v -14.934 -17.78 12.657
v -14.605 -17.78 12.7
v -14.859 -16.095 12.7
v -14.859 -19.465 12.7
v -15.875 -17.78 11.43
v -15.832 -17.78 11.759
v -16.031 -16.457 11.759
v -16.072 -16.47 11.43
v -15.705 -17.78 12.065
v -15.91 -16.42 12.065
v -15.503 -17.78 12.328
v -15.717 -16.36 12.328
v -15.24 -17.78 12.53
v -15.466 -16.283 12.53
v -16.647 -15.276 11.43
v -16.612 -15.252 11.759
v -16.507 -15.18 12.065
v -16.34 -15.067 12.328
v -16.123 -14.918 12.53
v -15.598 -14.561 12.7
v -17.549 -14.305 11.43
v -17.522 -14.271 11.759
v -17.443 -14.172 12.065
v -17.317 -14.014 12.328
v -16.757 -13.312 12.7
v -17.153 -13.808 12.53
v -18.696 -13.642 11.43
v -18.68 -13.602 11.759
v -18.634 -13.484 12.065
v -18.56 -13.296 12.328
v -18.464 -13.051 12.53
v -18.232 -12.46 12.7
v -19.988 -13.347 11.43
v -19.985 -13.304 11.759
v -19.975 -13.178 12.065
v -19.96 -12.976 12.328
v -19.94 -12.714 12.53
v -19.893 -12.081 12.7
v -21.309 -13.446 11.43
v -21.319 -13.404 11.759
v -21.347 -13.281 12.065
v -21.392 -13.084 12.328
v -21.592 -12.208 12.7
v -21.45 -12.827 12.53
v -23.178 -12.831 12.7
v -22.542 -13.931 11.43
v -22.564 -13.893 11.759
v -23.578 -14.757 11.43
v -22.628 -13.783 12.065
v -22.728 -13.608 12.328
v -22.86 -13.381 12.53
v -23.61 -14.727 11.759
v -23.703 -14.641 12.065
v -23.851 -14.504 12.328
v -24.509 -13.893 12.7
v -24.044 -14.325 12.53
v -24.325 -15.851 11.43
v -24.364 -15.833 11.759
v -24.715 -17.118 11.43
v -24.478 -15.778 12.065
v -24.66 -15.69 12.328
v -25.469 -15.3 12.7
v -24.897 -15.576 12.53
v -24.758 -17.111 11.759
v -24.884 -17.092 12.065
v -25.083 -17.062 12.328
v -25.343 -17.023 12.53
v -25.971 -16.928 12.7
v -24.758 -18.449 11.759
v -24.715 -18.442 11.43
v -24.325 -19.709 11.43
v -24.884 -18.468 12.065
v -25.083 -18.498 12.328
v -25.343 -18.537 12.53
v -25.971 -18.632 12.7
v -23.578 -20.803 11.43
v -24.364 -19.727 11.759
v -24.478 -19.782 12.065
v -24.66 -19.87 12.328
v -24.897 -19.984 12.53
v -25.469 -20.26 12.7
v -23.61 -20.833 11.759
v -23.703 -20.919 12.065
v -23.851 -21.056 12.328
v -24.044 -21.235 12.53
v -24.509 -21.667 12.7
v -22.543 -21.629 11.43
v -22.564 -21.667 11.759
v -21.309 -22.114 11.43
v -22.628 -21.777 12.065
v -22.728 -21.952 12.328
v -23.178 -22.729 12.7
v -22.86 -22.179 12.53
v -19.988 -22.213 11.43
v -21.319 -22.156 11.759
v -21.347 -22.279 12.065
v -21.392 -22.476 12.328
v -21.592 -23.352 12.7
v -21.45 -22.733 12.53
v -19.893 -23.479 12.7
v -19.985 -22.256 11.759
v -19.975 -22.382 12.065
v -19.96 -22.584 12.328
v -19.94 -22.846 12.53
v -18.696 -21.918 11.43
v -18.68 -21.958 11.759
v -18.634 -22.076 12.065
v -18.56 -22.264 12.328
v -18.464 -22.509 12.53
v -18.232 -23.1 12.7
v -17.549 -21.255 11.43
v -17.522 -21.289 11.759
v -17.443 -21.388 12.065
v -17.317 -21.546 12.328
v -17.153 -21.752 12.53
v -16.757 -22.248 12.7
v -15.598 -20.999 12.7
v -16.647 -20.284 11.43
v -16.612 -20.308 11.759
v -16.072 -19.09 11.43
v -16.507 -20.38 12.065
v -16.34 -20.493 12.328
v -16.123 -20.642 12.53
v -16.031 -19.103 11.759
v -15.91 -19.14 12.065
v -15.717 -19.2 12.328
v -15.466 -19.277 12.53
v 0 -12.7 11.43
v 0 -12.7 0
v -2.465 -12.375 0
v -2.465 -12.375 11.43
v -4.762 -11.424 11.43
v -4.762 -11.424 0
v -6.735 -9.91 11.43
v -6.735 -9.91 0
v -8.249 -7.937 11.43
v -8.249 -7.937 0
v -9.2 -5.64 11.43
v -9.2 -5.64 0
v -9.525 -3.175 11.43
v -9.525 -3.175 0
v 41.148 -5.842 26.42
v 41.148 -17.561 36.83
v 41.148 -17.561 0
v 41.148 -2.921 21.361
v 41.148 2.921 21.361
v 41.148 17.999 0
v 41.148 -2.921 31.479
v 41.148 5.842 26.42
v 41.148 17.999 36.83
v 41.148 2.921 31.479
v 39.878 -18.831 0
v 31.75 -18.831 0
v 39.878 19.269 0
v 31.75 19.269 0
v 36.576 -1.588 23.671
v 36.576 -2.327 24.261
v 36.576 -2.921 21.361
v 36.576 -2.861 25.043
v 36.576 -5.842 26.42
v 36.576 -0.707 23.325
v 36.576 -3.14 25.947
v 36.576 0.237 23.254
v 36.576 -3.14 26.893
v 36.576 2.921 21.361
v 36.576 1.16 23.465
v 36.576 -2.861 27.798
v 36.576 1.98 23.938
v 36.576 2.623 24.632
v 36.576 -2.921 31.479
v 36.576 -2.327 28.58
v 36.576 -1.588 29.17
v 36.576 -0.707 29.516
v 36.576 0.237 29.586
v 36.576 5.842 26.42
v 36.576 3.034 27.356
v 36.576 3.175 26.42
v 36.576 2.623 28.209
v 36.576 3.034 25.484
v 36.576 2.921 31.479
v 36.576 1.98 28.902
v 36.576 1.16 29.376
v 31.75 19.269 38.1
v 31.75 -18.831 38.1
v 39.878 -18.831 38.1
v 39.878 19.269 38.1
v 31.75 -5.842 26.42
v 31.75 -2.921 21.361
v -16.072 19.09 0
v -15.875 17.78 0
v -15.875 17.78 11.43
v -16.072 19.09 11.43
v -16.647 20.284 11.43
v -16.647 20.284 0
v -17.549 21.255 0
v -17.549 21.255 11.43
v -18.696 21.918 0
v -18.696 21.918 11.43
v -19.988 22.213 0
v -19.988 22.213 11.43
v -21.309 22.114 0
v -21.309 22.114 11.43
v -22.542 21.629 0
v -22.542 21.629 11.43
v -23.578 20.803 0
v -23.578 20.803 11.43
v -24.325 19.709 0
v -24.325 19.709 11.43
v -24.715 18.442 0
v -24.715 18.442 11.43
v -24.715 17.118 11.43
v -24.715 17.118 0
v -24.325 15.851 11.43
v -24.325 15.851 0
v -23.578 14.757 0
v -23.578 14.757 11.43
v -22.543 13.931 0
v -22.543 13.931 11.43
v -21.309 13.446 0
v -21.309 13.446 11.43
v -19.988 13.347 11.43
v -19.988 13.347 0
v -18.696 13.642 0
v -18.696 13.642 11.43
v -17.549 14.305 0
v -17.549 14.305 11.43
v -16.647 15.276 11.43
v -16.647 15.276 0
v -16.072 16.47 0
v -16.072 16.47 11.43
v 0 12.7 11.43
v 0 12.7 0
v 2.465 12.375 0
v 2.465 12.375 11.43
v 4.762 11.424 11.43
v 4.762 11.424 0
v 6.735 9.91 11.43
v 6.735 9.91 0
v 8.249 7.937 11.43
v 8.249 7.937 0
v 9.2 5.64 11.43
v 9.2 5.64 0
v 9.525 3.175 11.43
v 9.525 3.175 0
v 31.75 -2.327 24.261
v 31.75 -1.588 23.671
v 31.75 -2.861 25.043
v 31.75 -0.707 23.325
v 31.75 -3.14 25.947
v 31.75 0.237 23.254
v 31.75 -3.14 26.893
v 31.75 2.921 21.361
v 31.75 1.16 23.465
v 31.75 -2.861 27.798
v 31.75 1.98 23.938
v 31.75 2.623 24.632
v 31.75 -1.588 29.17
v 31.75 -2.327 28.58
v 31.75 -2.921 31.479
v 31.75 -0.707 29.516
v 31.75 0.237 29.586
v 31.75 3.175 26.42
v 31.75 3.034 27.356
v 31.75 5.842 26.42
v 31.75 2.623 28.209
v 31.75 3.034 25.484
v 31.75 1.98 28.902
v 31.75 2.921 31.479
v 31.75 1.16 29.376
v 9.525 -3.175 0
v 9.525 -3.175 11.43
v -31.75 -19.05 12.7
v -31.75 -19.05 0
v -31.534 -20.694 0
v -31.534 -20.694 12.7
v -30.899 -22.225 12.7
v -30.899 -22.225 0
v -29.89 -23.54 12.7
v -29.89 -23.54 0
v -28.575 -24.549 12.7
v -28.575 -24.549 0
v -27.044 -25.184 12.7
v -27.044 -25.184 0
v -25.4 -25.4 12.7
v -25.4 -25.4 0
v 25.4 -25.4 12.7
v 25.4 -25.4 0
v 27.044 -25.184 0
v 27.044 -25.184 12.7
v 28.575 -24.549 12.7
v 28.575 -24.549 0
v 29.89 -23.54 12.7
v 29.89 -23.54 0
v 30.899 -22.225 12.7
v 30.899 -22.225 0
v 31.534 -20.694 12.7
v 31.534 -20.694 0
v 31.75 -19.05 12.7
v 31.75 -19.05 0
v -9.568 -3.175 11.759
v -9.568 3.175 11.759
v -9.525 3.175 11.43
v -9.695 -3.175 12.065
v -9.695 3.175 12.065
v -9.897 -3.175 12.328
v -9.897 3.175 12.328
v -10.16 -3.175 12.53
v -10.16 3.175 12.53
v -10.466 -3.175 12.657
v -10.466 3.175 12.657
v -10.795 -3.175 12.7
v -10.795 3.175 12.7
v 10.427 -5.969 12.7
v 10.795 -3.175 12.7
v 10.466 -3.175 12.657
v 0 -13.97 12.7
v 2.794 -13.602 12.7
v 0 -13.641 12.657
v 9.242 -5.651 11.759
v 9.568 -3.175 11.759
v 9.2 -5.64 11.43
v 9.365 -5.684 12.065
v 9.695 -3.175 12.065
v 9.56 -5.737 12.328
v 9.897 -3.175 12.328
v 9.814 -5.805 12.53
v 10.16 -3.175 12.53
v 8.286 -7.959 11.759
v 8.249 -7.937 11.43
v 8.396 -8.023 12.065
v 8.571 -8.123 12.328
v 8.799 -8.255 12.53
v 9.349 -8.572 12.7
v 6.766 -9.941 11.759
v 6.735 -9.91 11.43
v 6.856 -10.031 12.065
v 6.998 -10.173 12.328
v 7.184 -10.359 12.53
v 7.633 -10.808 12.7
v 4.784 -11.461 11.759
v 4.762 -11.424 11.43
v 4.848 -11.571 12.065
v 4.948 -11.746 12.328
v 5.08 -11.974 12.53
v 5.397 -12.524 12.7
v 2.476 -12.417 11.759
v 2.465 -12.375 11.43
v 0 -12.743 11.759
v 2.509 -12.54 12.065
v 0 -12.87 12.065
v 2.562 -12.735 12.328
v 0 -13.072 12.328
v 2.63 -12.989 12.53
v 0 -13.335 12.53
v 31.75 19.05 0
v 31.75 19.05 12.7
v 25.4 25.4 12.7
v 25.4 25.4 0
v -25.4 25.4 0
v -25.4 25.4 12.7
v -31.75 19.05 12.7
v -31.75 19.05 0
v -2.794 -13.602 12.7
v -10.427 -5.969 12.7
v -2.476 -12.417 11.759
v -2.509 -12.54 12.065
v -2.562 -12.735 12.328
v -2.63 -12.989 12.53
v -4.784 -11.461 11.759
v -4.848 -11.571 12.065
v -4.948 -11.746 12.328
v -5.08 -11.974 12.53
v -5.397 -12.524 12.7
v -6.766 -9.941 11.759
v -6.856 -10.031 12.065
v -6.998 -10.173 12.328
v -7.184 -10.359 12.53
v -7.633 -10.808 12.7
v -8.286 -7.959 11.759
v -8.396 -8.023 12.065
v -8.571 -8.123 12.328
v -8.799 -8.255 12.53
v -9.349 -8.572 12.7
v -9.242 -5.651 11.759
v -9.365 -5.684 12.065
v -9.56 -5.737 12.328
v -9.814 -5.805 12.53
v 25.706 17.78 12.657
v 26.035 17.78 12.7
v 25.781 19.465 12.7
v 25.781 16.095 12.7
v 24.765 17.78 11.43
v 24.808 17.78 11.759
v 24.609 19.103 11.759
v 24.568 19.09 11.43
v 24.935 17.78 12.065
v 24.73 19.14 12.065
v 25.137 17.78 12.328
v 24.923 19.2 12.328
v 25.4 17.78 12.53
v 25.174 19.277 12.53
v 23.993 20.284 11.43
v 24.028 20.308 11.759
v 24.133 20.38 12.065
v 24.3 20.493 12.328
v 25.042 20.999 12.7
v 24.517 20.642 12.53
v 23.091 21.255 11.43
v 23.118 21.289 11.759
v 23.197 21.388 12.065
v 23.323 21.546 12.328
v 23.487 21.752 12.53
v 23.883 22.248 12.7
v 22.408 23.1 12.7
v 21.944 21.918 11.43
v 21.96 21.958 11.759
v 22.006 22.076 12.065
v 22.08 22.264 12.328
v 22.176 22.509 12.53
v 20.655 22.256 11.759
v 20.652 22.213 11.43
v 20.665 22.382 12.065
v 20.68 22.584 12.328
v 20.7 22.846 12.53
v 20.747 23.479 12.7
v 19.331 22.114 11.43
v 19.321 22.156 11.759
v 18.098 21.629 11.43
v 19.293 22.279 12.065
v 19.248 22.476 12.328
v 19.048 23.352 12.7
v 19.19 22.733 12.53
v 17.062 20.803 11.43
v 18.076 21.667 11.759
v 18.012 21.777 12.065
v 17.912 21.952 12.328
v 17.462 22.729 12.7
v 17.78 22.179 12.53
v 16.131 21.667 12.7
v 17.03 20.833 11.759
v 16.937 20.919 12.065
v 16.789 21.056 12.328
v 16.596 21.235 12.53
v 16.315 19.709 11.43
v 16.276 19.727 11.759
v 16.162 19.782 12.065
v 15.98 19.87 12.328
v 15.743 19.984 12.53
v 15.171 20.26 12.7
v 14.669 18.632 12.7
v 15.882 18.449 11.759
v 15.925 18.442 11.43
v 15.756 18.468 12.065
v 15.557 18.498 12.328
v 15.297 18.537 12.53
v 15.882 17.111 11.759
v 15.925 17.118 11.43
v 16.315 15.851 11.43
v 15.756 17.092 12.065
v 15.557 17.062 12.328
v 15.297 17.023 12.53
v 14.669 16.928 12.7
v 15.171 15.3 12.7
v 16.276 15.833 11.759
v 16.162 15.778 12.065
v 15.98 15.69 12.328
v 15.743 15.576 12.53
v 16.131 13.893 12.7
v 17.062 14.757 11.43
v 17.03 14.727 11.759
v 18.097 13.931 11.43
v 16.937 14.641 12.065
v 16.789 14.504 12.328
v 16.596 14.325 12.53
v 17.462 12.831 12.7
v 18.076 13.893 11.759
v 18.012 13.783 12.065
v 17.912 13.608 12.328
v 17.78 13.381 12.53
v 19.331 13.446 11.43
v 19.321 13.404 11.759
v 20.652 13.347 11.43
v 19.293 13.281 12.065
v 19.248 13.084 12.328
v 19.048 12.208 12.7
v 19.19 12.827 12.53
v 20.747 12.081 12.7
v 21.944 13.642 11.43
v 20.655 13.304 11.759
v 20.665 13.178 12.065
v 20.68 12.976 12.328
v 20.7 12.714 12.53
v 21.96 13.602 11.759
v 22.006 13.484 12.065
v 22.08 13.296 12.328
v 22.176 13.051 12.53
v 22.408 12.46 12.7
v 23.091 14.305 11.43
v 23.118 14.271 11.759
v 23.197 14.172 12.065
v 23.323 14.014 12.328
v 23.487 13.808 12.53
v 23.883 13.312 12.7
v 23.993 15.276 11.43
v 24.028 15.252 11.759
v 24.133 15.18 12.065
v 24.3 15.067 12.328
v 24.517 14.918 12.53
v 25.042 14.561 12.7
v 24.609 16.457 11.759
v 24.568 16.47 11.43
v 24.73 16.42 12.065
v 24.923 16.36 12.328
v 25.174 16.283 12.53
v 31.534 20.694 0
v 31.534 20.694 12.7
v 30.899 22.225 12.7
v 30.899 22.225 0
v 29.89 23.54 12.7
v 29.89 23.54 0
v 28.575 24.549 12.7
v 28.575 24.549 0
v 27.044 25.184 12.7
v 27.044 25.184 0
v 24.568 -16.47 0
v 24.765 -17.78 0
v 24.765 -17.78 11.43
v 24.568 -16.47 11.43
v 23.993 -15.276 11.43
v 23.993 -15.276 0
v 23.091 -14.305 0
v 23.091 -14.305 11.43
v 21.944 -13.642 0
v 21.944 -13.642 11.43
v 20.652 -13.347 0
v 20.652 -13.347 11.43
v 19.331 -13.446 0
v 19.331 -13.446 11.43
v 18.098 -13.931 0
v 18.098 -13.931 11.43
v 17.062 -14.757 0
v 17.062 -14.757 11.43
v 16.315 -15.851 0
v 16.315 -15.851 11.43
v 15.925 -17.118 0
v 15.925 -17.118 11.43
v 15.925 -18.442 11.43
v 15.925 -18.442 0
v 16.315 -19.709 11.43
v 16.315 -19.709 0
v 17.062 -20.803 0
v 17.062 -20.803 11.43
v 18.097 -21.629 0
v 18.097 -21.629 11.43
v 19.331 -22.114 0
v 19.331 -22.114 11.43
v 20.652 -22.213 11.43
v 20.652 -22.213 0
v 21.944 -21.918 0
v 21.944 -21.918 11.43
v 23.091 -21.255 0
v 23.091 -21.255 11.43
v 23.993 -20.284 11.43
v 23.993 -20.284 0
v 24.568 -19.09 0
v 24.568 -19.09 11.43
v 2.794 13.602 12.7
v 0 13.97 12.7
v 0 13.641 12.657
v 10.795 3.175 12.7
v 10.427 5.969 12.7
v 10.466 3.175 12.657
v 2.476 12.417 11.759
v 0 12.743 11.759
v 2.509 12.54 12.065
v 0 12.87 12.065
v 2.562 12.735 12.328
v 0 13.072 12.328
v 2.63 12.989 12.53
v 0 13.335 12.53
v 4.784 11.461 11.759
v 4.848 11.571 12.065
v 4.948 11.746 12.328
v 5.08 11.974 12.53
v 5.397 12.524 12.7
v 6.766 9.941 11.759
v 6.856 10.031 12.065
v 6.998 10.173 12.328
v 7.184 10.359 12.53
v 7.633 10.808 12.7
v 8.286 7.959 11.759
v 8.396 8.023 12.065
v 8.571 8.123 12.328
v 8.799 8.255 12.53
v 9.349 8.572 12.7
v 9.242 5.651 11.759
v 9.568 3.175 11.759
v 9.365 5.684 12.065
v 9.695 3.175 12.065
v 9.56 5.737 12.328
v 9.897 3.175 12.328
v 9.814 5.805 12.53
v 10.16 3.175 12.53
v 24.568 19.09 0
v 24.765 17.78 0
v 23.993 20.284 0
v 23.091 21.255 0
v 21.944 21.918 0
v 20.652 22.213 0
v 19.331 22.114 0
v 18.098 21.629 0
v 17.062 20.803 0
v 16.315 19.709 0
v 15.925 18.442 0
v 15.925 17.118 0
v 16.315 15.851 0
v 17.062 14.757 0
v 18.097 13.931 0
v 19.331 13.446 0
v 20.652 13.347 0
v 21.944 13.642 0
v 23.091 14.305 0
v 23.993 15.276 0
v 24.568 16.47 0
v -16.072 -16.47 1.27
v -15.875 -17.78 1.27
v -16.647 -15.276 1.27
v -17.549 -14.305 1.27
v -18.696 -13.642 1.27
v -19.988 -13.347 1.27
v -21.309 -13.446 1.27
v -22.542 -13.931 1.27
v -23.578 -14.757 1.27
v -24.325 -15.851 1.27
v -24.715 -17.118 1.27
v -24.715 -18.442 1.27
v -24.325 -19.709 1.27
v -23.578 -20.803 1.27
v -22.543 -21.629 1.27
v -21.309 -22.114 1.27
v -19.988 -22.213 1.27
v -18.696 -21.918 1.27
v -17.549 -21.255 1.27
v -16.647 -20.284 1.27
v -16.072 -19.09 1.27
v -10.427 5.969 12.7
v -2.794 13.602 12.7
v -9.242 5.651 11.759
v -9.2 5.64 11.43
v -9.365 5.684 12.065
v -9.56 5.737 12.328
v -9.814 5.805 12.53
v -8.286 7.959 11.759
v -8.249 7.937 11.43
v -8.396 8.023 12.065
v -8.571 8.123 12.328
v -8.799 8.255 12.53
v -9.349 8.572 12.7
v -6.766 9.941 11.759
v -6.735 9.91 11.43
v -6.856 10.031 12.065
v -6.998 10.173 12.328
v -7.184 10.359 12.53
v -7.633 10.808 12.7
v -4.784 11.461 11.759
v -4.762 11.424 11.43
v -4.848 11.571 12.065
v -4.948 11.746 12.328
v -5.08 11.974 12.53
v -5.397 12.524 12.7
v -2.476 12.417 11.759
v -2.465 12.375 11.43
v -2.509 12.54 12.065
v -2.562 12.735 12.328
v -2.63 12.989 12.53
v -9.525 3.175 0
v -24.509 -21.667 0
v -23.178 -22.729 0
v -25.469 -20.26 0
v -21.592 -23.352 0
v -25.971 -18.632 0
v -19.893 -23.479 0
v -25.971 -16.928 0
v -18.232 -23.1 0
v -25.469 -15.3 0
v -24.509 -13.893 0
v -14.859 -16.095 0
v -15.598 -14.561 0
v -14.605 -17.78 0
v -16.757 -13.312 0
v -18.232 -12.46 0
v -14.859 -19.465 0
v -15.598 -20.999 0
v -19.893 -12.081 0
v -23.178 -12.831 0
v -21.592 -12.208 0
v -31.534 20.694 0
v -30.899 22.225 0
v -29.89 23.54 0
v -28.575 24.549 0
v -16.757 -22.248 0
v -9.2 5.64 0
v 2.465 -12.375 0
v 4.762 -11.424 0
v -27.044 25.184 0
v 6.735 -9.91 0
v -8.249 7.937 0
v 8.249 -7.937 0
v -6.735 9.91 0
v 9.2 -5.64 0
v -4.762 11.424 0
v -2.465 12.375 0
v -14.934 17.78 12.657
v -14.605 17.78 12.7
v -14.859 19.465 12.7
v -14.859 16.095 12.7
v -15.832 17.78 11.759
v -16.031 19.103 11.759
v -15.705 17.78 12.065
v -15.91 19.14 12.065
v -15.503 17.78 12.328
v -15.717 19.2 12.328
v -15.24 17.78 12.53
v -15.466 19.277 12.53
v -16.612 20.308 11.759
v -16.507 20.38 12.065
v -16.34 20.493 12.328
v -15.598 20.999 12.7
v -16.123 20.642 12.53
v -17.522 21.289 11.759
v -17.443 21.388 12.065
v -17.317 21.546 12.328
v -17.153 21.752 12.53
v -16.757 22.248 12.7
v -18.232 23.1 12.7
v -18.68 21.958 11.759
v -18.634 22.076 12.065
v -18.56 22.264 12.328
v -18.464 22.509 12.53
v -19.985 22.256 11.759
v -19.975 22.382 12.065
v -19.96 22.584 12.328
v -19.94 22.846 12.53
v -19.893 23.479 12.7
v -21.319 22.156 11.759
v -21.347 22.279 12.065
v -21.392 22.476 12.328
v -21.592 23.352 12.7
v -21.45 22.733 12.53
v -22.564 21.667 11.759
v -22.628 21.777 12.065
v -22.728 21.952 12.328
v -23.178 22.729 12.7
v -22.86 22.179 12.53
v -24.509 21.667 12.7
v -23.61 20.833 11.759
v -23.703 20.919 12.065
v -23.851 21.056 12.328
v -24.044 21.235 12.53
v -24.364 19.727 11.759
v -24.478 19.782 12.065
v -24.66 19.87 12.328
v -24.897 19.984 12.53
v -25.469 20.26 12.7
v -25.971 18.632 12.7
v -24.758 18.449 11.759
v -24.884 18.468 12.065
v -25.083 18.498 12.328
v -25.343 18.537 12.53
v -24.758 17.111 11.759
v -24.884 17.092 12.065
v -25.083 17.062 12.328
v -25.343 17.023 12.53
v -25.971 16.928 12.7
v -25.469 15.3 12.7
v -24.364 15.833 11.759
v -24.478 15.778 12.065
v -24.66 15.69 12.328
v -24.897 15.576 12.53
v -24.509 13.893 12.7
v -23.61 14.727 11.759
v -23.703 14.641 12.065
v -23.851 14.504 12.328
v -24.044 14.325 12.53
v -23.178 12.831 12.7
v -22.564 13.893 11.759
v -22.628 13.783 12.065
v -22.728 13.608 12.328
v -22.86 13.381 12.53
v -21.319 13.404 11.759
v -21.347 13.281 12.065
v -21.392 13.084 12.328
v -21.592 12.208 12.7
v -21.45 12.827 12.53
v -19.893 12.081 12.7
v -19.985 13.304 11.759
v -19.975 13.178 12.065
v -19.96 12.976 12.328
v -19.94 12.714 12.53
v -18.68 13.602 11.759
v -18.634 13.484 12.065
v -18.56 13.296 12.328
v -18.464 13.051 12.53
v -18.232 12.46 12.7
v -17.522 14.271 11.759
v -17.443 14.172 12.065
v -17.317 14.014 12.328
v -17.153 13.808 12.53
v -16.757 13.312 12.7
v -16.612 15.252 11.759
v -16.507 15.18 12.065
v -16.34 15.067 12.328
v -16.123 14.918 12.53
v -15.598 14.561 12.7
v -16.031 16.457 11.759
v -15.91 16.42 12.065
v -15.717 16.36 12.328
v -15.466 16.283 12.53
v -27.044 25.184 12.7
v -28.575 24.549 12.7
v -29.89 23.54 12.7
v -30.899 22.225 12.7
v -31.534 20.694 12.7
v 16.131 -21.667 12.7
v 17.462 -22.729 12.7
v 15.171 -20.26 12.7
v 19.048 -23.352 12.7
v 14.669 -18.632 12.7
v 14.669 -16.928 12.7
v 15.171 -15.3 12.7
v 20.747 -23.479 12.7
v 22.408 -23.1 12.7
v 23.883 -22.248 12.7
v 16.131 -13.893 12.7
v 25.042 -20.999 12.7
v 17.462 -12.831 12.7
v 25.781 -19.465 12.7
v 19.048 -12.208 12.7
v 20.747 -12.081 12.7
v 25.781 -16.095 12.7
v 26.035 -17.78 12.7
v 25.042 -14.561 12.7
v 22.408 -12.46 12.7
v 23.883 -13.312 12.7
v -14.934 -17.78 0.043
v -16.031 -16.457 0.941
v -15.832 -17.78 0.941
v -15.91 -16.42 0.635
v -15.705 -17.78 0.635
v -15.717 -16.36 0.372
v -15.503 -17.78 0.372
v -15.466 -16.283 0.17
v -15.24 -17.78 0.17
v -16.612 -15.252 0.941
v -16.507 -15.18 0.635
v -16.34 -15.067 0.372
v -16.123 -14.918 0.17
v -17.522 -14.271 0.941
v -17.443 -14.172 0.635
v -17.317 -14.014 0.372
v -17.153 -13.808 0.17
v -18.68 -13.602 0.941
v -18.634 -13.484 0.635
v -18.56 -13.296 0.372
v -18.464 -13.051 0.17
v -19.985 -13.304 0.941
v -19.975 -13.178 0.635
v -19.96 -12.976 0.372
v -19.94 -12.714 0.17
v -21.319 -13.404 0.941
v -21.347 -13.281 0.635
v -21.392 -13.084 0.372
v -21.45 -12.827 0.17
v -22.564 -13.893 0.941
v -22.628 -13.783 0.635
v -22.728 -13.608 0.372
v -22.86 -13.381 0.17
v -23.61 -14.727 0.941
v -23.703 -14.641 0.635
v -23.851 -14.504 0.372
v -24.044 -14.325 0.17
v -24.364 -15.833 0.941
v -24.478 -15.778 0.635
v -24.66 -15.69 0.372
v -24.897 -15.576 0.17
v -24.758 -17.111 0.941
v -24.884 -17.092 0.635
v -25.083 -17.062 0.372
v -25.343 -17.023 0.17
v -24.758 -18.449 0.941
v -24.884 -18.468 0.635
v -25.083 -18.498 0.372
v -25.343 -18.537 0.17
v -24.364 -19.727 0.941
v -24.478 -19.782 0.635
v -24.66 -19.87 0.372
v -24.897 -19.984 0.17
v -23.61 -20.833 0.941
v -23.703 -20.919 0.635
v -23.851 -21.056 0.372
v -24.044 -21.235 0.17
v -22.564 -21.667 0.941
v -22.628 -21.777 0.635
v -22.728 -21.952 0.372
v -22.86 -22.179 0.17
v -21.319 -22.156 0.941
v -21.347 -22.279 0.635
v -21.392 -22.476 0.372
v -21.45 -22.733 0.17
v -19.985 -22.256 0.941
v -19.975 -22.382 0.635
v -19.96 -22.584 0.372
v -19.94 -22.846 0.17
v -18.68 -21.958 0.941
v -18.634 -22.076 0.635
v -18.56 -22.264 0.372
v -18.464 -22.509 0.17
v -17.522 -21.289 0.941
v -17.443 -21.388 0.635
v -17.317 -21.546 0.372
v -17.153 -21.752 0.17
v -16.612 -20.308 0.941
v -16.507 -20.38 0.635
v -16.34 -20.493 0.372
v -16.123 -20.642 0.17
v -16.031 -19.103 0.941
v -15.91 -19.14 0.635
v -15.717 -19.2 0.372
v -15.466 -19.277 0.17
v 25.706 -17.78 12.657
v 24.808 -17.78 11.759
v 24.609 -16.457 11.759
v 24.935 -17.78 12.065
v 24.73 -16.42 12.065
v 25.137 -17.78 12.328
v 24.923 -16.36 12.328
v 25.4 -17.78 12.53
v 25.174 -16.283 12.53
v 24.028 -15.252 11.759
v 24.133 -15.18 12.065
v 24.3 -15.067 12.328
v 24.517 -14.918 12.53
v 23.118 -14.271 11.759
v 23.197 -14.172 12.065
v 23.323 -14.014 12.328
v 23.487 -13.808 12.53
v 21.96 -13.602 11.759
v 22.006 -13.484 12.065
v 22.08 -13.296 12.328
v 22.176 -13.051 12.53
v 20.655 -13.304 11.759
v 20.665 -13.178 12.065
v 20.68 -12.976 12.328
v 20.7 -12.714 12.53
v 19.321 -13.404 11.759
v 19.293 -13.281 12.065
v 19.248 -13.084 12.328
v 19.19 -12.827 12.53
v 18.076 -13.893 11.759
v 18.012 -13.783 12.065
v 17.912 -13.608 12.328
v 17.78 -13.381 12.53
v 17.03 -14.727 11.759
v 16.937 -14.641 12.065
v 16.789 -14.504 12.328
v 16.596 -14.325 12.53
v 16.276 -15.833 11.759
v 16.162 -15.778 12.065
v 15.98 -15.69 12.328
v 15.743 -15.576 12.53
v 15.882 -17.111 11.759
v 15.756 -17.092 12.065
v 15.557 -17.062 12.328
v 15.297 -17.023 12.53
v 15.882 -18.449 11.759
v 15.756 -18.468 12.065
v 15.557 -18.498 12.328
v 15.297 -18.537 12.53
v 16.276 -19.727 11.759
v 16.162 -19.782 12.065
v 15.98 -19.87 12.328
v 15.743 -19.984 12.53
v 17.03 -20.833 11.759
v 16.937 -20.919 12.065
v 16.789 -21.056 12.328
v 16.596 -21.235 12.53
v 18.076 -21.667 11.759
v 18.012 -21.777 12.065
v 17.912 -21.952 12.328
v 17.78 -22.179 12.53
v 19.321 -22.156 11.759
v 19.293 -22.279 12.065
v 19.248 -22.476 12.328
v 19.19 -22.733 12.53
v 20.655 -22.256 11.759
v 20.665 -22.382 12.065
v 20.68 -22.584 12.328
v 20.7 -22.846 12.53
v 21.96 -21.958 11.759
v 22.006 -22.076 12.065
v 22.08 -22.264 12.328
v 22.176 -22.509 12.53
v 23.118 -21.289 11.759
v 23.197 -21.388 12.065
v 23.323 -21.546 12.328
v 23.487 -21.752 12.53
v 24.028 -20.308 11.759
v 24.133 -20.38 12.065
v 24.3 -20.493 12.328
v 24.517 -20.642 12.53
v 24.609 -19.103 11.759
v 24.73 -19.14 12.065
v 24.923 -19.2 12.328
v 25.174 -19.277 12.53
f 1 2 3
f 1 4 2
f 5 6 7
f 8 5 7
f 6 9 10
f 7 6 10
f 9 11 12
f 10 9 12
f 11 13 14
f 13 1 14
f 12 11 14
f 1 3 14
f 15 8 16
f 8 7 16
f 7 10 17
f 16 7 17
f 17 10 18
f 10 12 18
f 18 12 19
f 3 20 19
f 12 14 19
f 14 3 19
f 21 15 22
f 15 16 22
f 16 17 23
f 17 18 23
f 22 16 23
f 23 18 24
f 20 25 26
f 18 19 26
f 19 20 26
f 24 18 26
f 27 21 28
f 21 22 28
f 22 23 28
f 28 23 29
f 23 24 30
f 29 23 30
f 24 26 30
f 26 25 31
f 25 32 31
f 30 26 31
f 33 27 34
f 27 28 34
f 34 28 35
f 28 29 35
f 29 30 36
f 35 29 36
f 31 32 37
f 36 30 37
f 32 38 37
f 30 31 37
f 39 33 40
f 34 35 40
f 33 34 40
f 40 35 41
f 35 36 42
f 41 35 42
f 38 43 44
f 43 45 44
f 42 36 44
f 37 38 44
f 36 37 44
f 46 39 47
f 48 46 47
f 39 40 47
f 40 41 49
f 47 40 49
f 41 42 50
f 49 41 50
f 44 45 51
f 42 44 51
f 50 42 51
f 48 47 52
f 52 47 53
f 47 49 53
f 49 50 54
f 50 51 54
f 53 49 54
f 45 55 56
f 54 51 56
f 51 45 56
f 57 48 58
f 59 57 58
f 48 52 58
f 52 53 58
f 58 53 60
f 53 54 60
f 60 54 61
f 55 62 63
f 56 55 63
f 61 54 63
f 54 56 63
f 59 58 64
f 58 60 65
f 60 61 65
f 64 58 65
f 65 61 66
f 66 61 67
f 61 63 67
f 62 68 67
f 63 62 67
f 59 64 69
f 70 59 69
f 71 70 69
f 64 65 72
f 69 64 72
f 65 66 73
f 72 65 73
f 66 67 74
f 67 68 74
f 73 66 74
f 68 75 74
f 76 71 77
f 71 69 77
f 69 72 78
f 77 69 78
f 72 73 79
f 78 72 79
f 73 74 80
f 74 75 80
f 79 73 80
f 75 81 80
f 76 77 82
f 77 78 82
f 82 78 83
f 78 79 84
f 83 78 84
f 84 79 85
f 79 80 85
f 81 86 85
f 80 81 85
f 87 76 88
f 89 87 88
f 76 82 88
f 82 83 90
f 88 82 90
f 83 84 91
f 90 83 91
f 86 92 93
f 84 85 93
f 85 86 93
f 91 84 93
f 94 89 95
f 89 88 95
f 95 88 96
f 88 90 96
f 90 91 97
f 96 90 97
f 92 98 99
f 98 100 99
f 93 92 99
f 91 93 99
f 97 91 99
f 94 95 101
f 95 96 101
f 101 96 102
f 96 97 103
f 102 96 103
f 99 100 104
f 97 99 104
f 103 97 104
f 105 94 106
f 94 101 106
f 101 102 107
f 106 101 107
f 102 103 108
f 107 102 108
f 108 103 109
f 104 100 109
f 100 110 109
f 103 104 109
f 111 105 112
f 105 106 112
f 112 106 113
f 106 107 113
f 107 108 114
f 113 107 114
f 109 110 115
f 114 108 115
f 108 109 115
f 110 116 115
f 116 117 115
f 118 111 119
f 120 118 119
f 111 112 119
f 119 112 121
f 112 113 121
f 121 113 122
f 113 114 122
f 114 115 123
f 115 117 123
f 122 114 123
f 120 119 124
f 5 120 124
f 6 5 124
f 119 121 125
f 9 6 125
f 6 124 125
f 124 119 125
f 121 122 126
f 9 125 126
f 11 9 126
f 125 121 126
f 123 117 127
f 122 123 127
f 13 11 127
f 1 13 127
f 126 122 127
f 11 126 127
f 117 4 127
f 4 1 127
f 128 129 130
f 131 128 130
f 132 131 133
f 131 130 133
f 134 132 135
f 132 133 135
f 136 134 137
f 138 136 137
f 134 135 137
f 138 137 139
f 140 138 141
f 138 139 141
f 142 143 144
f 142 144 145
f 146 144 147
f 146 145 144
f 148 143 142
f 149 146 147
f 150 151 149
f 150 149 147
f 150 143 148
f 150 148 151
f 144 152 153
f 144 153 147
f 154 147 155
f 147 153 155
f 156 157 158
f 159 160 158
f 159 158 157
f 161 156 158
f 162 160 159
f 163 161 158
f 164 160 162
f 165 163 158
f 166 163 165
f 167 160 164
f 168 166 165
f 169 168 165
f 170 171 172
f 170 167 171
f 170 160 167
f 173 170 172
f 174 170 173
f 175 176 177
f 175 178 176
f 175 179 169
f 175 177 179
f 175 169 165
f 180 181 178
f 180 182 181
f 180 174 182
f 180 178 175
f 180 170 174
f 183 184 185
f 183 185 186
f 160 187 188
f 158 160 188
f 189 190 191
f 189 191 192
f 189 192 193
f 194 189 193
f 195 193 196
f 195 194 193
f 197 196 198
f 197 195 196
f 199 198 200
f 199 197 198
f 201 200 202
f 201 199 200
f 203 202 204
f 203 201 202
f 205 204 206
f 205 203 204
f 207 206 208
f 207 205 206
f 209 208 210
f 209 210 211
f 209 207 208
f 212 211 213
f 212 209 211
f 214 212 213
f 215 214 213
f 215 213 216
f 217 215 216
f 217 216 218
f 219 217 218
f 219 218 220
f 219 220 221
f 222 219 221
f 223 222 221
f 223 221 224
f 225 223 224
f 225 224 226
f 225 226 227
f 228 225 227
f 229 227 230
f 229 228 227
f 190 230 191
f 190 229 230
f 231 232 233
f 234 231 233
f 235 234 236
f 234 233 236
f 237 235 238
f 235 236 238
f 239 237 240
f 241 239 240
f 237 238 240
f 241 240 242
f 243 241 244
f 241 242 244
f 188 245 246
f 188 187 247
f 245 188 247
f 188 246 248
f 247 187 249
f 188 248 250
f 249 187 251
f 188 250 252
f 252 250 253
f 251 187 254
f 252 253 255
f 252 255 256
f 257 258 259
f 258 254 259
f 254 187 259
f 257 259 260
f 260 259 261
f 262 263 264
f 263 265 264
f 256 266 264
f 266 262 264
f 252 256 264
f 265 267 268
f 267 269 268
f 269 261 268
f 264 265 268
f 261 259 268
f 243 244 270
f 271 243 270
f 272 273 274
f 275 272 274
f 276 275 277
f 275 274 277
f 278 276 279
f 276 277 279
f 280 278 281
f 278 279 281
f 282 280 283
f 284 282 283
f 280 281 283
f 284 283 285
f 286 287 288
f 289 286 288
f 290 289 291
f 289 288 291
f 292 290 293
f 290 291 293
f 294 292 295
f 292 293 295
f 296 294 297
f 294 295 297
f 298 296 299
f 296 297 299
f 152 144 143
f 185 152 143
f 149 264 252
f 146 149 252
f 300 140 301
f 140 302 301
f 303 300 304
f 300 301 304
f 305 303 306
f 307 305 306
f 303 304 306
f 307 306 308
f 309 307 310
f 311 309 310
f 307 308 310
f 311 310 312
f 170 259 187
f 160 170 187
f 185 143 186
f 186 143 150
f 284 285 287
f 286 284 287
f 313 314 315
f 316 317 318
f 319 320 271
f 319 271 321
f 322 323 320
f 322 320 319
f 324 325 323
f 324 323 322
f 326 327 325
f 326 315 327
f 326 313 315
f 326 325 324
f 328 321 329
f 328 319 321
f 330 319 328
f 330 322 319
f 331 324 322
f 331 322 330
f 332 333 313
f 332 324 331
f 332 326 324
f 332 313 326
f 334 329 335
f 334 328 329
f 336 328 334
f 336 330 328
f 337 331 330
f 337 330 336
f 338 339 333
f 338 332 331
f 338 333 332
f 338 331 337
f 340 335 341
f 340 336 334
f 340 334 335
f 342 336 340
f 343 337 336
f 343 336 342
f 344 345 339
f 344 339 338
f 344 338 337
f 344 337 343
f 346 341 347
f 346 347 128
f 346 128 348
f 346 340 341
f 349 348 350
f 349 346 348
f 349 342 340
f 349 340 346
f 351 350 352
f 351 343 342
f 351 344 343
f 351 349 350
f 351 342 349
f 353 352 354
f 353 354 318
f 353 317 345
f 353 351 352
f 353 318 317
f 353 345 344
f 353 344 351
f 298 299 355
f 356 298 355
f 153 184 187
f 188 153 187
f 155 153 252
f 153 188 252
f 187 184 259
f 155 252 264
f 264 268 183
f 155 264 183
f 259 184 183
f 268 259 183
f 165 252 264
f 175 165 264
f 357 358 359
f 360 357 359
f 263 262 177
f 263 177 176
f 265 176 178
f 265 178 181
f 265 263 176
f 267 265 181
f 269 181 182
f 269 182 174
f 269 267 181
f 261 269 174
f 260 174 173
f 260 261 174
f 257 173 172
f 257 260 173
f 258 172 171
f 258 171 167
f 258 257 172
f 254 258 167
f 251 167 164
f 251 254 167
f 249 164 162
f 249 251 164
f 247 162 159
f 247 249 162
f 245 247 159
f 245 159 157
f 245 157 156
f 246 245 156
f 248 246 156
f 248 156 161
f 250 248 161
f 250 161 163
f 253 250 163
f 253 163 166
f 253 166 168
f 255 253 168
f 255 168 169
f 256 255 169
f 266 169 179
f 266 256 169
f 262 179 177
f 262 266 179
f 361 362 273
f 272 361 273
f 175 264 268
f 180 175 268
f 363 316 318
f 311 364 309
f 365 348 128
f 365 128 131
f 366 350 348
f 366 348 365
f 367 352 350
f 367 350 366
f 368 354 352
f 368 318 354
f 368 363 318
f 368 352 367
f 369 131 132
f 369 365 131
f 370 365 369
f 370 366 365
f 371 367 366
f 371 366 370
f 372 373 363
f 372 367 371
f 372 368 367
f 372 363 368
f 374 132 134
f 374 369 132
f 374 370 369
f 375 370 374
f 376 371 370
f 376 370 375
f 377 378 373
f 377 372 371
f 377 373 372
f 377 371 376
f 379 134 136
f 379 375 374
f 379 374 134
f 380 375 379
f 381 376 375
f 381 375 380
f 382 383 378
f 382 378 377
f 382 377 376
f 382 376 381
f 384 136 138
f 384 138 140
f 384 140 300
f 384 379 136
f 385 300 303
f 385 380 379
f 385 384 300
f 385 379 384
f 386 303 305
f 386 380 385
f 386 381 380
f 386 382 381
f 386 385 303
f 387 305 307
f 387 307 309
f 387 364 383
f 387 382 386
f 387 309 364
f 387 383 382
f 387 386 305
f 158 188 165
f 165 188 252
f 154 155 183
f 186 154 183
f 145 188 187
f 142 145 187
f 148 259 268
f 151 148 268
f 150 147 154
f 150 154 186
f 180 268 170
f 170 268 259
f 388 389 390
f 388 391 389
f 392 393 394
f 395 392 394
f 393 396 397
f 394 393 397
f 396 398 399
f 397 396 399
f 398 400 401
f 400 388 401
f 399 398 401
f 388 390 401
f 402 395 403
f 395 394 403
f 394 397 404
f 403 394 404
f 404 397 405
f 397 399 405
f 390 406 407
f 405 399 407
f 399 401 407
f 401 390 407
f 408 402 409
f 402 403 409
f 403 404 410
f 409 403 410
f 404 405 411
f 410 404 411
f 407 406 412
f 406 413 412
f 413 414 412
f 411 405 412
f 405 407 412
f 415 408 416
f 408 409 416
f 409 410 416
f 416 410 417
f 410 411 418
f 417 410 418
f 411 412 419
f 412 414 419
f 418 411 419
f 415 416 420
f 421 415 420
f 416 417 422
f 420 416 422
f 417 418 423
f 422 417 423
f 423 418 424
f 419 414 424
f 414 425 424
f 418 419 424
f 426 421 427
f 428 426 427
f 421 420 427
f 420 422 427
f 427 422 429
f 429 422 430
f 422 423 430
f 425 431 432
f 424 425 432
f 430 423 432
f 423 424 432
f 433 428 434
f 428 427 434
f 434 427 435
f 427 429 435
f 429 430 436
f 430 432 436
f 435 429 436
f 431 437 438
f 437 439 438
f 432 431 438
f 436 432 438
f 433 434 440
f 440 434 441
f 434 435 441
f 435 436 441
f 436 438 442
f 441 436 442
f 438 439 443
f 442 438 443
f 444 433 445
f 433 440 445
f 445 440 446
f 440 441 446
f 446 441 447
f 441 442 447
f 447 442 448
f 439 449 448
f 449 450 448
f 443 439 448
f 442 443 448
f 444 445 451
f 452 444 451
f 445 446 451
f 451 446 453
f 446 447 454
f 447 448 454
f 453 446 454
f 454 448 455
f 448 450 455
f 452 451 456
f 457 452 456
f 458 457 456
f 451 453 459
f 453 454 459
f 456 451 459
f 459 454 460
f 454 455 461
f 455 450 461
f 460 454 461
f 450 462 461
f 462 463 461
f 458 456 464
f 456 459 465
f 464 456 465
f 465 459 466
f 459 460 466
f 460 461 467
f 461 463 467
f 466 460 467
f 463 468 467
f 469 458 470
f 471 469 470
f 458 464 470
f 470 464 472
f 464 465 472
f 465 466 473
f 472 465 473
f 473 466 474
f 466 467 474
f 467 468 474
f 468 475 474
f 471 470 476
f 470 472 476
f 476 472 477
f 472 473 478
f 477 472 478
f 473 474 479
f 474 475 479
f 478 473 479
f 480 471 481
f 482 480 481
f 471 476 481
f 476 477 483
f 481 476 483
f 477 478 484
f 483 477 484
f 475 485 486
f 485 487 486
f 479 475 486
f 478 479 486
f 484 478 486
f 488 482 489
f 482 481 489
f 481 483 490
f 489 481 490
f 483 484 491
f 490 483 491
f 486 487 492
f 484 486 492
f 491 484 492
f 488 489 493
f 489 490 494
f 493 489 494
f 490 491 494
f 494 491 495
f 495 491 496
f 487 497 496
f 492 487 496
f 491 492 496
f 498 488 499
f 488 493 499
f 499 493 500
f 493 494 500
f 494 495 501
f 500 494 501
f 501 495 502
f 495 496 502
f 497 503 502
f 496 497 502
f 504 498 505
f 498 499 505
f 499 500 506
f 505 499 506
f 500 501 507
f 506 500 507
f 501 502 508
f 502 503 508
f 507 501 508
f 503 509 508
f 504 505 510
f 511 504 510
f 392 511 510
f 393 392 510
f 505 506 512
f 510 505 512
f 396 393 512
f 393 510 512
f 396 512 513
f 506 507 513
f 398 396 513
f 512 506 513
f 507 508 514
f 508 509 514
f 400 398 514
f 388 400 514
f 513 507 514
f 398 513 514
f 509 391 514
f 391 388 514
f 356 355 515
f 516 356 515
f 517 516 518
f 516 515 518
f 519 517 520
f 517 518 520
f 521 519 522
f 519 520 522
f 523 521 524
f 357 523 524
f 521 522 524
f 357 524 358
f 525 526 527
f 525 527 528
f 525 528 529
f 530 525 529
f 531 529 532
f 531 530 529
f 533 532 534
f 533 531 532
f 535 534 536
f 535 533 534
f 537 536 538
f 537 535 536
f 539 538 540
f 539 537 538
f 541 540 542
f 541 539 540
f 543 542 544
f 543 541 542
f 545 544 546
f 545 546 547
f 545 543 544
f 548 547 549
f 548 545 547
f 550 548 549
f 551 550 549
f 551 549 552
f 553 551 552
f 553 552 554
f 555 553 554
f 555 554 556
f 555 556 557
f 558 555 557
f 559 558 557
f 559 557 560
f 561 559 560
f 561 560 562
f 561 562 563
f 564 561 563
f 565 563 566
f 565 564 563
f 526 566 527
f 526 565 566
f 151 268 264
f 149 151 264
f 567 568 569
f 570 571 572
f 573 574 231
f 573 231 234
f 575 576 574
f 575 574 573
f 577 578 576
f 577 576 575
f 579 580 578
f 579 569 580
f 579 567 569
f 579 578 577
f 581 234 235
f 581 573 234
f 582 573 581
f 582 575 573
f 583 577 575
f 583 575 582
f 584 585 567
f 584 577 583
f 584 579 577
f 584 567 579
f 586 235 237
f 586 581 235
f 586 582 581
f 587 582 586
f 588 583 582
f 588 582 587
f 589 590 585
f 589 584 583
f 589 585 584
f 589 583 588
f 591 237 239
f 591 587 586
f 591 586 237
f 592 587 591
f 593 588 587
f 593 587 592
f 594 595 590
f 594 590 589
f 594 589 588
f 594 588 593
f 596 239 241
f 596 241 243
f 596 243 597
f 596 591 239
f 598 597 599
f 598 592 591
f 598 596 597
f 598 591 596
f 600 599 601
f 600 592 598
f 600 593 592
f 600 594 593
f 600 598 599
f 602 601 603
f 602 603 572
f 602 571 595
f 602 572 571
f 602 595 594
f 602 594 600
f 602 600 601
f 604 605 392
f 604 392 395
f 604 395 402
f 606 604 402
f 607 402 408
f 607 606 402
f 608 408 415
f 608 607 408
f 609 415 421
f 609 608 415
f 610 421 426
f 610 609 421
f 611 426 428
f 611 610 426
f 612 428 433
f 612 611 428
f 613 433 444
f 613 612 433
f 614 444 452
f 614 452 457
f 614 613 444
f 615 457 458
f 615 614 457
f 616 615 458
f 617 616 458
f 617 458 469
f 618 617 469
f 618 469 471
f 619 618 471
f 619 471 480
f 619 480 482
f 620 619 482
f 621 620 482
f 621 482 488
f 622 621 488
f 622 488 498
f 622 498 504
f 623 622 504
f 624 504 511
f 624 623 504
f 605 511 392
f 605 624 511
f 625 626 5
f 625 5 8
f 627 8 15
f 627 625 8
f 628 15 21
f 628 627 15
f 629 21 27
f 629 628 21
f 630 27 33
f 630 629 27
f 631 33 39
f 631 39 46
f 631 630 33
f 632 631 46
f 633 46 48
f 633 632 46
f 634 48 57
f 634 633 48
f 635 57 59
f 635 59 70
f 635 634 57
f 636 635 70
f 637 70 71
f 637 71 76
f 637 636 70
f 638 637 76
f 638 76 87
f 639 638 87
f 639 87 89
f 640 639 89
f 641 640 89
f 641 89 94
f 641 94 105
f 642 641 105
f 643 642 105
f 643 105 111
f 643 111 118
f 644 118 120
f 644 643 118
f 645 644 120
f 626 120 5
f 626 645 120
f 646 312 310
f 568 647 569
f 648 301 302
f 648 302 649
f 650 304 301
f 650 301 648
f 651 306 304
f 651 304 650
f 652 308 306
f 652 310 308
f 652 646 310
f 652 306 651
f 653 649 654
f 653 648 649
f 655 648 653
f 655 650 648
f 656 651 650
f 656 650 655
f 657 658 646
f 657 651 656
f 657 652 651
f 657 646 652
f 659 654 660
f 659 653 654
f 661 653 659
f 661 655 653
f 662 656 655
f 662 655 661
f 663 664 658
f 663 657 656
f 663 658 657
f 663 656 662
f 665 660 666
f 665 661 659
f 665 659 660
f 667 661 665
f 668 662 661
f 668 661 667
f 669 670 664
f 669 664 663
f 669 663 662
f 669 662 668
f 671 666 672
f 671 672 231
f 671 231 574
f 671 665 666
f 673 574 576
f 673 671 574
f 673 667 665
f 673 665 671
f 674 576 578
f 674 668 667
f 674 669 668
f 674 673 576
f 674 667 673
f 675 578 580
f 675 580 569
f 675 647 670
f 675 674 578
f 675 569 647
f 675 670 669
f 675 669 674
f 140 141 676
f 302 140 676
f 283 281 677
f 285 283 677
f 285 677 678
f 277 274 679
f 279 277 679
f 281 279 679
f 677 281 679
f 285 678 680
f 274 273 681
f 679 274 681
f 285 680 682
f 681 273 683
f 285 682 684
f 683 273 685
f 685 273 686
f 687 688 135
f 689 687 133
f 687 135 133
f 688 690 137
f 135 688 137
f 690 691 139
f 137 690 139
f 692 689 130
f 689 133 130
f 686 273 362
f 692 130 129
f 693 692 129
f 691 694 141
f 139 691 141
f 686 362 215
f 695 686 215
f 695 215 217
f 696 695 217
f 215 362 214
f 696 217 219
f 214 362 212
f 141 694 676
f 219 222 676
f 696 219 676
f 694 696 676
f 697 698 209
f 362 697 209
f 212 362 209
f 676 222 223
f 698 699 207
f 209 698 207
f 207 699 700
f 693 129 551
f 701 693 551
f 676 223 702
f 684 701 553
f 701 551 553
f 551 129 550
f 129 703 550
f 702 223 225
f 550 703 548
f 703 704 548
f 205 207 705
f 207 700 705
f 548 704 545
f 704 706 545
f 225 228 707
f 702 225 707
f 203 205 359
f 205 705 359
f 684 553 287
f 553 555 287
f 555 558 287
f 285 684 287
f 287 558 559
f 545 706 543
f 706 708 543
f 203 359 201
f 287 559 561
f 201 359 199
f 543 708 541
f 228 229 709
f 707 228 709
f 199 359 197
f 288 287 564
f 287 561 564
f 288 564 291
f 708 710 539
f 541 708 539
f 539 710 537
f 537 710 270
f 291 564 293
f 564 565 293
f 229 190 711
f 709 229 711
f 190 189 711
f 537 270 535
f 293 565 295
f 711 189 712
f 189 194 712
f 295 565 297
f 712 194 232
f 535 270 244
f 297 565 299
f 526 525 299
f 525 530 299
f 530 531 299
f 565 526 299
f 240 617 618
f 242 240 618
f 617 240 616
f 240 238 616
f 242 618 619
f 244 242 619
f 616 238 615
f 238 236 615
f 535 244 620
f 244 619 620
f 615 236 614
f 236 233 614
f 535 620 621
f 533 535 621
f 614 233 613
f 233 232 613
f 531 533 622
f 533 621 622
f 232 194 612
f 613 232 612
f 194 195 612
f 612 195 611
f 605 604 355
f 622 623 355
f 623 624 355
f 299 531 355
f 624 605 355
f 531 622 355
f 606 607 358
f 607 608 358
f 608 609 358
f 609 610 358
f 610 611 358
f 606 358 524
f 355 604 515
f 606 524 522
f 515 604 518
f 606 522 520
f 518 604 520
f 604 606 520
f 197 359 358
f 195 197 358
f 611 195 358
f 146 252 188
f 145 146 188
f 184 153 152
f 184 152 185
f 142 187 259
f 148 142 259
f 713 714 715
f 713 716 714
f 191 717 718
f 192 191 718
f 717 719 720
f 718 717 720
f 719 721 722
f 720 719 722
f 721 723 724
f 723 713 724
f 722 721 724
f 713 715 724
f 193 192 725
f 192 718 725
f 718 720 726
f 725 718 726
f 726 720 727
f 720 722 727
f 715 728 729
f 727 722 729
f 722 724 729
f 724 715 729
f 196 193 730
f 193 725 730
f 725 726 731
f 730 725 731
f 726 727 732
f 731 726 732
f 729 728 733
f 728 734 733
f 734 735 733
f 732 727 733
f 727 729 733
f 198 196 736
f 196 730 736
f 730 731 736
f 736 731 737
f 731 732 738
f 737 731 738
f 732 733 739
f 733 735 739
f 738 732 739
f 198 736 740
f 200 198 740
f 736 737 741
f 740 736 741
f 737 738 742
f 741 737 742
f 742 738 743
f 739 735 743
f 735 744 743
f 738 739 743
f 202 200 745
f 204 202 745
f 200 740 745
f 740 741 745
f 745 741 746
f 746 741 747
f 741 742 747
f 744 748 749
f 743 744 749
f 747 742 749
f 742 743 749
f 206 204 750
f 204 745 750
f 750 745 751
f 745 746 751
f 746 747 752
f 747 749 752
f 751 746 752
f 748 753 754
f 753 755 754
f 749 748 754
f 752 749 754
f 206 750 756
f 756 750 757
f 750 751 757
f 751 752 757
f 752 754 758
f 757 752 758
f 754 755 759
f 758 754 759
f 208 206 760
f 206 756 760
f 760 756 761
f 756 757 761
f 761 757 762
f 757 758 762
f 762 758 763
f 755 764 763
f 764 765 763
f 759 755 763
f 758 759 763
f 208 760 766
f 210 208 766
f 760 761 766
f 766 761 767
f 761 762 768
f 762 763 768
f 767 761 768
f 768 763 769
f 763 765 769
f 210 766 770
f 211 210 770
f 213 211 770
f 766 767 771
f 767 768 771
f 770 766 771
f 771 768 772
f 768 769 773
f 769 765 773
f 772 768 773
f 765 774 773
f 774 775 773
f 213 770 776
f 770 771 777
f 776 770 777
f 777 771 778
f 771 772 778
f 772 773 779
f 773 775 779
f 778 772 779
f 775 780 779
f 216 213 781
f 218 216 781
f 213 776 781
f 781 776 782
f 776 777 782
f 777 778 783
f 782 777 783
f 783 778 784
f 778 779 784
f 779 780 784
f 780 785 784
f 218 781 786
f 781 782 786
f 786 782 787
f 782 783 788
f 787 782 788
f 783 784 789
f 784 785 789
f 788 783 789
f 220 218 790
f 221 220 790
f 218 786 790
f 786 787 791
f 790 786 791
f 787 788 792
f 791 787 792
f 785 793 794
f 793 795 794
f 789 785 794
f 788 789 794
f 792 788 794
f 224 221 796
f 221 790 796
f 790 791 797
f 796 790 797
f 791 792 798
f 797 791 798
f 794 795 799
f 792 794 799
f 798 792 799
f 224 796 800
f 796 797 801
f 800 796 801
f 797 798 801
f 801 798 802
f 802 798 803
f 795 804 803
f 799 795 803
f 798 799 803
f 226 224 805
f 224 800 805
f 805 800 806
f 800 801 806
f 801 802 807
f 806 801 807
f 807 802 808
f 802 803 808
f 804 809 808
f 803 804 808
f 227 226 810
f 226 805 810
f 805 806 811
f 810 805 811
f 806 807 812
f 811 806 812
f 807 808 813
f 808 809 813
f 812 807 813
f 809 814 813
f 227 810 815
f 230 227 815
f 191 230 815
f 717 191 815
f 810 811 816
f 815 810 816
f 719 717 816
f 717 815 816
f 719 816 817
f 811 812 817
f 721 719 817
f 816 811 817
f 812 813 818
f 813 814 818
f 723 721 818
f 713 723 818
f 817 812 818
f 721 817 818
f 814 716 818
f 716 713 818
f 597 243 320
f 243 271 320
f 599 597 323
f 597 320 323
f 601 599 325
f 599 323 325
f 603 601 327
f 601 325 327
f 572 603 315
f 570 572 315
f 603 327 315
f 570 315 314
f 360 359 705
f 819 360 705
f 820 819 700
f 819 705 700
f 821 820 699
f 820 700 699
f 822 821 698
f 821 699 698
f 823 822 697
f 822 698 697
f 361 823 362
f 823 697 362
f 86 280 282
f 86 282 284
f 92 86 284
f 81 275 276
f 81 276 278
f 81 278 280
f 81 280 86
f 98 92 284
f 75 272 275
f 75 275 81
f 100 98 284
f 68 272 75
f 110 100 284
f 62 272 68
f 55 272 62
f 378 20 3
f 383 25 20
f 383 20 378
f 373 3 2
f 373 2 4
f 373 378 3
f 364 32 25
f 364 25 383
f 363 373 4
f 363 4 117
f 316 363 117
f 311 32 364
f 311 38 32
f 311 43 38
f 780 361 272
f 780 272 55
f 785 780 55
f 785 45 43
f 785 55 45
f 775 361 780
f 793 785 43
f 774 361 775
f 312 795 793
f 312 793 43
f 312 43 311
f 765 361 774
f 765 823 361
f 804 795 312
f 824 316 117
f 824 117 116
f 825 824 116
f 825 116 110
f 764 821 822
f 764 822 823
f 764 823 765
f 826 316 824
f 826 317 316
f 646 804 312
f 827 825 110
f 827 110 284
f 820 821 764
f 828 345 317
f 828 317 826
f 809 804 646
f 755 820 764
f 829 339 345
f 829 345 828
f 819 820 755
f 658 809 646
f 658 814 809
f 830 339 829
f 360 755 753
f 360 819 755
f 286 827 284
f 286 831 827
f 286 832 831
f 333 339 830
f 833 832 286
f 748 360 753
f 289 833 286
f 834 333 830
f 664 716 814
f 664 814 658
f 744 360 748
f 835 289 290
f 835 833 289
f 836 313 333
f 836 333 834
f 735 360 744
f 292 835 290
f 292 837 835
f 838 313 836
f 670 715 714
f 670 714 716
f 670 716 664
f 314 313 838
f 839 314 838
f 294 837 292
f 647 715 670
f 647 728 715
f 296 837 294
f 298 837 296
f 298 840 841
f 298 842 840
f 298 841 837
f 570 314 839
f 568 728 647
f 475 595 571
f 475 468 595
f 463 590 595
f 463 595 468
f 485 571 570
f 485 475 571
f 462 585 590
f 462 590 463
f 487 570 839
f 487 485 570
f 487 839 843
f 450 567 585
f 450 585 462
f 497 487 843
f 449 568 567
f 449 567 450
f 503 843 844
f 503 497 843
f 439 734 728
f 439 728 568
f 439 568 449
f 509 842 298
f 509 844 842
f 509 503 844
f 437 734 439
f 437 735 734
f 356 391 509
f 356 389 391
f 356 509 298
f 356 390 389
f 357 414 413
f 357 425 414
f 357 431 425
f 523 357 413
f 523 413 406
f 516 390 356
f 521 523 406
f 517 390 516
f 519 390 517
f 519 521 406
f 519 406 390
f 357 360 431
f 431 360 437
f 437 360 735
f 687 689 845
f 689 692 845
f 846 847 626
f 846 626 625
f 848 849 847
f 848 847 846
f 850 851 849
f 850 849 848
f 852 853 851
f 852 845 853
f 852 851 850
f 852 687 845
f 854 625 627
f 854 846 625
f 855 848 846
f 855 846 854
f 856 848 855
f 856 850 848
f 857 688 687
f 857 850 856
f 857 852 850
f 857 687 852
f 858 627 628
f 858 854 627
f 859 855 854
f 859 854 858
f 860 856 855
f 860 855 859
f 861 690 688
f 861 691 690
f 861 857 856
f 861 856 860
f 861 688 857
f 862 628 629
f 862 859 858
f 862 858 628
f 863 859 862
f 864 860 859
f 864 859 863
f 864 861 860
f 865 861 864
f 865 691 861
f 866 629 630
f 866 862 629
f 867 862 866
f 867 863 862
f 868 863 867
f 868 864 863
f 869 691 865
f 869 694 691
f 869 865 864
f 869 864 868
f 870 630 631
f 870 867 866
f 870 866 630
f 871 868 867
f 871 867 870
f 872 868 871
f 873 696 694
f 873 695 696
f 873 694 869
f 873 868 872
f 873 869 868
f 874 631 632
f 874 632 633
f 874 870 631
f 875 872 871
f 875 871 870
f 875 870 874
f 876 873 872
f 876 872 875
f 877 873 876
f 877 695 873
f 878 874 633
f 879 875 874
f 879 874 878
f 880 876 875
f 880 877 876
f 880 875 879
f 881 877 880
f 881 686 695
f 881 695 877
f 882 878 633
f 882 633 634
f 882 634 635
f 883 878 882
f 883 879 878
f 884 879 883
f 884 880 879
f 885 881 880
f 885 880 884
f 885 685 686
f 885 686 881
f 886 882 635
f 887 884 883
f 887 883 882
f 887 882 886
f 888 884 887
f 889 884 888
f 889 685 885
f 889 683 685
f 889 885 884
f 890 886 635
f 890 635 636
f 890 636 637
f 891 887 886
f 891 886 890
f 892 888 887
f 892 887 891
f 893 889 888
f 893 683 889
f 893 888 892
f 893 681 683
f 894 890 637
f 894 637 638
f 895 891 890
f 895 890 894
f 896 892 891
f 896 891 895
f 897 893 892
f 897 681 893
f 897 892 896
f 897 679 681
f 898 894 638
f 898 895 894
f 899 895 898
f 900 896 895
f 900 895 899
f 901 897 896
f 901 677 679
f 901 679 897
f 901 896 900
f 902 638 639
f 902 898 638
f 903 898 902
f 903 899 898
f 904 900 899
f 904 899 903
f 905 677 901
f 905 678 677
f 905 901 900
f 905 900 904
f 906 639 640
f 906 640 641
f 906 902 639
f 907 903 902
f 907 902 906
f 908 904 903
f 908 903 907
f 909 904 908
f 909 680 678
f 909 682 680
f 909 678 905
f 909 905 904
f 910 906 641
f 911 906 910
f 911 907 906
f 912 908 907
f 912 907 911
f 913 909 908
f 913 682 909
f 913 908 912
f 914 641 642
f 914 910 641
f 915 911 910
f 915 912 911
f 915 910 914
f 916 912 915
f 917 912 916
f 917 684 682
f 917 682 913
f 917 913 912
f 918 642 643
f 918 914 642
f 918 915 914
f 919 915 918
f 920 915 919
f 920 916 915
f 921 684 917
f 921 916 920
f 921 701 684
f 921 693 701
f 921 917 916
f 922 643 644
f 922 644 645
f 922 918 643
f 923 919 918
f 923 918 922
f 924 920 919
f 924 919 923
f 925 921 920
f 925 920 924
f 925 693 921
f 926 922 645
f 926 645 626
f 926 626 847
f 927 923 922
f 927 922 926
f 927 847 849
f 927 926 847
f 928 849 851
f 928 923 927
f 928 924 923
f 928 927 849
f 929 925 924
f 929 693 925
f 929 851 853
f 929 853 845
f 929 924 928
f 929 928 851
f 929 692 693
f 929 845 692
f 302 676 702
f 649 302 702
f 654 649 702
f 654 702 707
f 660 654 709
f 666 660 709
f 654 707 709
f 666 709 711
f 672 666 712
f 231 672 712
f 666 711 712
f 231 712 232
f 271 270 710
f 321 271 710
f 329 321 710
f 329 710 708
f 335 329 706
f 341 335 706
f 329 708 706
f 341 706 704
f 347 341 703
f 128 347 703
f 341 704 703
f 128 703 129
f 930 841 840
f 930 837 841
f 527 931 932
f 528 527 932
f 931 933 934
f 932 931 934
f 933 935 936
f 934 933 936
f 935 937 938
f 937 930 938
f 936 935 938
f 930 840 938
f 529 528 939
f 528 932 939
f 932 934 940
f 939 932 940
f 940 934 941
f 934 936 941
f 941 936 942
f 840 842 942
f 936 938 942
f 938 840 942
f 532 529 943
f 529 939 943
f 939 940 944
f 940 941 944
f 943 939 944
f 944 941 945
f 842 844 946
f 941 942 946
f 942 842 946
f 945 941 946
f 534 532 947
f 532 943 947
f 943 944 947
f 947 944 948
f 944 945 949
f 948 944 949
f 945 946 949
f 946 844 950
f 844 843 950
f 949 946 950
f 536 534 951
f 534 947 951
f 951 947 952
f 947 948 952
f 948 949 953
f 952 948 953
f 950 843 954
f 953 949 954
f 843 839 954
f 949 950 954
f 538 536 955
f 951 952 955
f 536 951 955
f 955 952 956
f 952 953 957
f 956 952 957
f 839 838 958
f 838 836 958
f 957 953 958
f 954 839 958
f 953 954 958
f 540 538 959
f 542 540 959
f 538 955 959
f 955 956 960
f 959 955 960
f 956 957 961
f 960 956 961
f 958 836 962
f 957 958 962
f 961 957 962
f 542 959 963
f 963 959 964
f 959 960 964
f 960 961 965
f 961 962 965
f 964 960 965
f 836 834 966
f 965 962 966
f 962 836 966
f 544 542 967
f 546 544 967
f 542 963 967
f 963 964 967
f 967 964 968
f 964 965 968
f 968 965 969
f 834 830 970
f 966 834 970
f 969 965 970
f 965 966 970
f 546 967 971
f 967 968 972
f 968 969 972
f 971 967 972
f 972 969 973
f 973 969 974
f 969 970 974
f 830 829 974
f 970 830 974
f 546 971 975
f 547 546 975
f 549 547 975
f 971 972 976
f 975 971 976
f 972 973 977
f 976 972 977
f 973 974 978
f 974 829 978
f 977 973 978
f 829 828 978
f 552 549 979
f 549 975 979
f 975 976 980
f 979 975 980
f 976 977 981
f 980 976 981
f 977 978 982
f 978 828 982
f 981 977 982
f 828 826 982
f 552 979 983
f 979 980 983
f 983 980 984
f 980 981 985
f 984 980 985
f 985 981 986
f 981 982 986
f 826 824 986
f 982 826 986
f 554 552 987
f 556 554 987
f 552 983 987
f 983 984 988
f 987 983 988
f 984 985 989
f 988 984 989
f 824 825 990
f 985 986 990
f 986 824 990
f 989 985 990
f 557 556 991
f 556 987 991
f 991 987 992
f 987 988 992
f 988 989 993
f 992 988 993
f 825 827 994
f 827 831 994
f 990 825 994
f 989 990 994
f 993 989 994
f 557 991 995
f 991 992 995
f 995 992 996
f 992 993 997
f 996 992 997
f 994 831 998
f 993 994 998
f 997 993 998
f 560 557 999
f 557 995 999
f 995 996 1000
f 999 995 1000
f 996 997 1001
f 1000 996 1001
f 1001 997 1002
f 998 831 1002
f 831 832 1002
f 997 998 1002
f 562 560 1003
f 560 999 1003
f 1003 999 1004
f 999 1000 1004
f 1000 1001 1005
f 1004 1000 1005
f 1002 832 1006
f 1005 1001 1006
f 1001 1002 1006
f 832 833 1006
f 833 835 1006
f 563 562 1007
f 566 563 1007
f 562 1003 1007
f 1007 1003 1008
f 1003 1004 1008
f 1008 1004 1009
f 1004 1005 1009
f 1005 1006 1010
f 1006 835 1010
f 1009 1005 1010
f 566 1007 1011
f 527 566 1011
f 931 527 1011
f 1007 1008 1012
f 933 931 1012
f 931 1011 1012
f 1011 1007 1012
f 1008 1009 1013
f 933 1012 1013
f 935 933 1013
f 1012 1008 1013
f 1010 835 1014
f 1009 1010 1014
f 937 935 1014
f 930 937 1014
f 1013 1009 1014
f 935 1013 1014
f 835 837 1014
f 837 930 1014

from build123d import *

# Parameters (mm, degrees)
F0_R     = 4.445
F1_DEPTH = 12.7
F2_R     = 1.27
F4_START = 31.75
F3_R     = 3.175
F4_DEPTH = 4.826
F5_START = 31.75
F3_W     = 38.1
F3_H     = 38.1
F5_DEPTH = 9.398
F6_SIZE  = 1.27


with BuildPart() as f1:
    # F0 (on Top) → F1 (new body)
    with BuildSketch(Plane.XY):
        with BuildLine():
            ThreePointArc((31.75, 19.05), (29.8901280605, 23.5401280605), (25.4, 25.4))
            Line((25.4, 25.4), (-25.4, 25.4))
            ThreePointArc((-25.4, 25.4), (-29.8901280605, 23.5401280605), (-31.75, 19.05))
            Line((-31.75, 19.05), (-31.75, -19.05))
            ThreePointArc((-31.75, -19.05), (-29.8901280605, -23.5401280605), (-25.4, -25.4))
            Line((-25.4, -25.4), (25.4, -25.4))
            ThreePointArc((25.4, -25.4), (29.8901280605, -23.5401280605), (31.75, -19.05))
            Line((31.75, -19.05), (31.75, 19.05))
        make_face()
        with Locations((-20.32, -17.78)):
            Circle(F0_R, mode=Mode.SUBTRACT)
        with Locations((20.32, -17.78)):
            Circle(F0_R, mode=Mode.SUBTRACT)
        with BuildLine():
            ThreePointArc((0, 12.7), (6.7351920908, 9.9101920908), (9.525, 3.175))
            Line((9.525, 3.175), (9.525, -3.175))
            ThreePointArc((9.525, -3.175), (6.7351920908, -9.9101920908), (0, -12.7))
            ThreePointArc((0, -12.7), (-6.7351920908, -9.9101920908), (-9.525, -3.175))
            Line((-9.525, -3.175), (-9.525, 3.175))
            ThreePointArc((-9.525, 3.175), (-6.7351920908, 9.9101920908), (0, 12.7))
        make_face(mode=Mode.SUBTRACT)
        with Locations((-20.32, 17.78)):
            Circle(F0_R, mode=Mode.SUBTRACT)
        with Locations((20.32, 17.78)):
            Circle(F0_R, mode=Mode.SUBTRACT)
    extrude(amount=F1_DEPTH)

    # F2
    f2_edges = [f1.edges().sort_by_distance(p)[0] for p in [
        (-24.765, 17.78, 12.7),
        (-15.875, -17.78, 6.35),
        (-24.765, -17.78, 0),
        (-24.765, -17.78, 12.7),
        (15.875, -17.78, 12.7),
        (15.875, 17.78, 12.7),
        (0, -12.7, 12.7),
        (-9.525, 0, 12.7),
        (0, 12.7, 12.7),
        (9.525, 0, 12.7),
    ]]
    fillet(f2_edges, radius=F2_R)


with BuildPart() as f4:
    # F3 (on Right) → F4 (new body)
    with BuildSketch(Plane.YZ.offset(F4_START)):
        Polygon((-2.9209193859, 21.3609840721), (2.9209193859, 21.3609840721), (5.8418387719, 26.4201648533), (2.9209193859, 31.4793456346), (-2.9209193859, 31.4793456346), (-5.8418387719, 26.4201648533), align=None)
        with Locations((0, 26.4201648533)):
            Circle(F3_R, mode=Mode.SUBTRACT)
    extrude(amount=F4_DEPTH)


with BuildPart() as f5:
    # F3 (on Right) → F5 (new body)
    with BuildSketch(Plane.YZ.offset(F5_START)):
        with Locations((0.2186053872, 19.05)):
            Rectangle(F3_W, F3_H)
        Polygon((5.8418387719, 26.4201648533), (2.9209193859, 21.3609840721), (-2.9209193859, 21.3609840721), (-5.8418387719, 26.4201648533), (-2.9209193859, 31.4793456346), (2.9209193859, 31.4793456346), align=None, mode=Mode.SUBTRACT)
    extrude(amount=F5_DEPTH)

    # F6
    f6_edges = [f5.edges().sort_by_distance(p)[0] for p in [
        (41.148, 0.218605, 38.1),
        (41.148, -18.831395, 19.05),
        (41.148, 19.268605, 19.05),
    ]]
    chamfer(f6_edges, length=F6_SIZE)


solid = Compound([f1.part, f4.part, f5.part])
